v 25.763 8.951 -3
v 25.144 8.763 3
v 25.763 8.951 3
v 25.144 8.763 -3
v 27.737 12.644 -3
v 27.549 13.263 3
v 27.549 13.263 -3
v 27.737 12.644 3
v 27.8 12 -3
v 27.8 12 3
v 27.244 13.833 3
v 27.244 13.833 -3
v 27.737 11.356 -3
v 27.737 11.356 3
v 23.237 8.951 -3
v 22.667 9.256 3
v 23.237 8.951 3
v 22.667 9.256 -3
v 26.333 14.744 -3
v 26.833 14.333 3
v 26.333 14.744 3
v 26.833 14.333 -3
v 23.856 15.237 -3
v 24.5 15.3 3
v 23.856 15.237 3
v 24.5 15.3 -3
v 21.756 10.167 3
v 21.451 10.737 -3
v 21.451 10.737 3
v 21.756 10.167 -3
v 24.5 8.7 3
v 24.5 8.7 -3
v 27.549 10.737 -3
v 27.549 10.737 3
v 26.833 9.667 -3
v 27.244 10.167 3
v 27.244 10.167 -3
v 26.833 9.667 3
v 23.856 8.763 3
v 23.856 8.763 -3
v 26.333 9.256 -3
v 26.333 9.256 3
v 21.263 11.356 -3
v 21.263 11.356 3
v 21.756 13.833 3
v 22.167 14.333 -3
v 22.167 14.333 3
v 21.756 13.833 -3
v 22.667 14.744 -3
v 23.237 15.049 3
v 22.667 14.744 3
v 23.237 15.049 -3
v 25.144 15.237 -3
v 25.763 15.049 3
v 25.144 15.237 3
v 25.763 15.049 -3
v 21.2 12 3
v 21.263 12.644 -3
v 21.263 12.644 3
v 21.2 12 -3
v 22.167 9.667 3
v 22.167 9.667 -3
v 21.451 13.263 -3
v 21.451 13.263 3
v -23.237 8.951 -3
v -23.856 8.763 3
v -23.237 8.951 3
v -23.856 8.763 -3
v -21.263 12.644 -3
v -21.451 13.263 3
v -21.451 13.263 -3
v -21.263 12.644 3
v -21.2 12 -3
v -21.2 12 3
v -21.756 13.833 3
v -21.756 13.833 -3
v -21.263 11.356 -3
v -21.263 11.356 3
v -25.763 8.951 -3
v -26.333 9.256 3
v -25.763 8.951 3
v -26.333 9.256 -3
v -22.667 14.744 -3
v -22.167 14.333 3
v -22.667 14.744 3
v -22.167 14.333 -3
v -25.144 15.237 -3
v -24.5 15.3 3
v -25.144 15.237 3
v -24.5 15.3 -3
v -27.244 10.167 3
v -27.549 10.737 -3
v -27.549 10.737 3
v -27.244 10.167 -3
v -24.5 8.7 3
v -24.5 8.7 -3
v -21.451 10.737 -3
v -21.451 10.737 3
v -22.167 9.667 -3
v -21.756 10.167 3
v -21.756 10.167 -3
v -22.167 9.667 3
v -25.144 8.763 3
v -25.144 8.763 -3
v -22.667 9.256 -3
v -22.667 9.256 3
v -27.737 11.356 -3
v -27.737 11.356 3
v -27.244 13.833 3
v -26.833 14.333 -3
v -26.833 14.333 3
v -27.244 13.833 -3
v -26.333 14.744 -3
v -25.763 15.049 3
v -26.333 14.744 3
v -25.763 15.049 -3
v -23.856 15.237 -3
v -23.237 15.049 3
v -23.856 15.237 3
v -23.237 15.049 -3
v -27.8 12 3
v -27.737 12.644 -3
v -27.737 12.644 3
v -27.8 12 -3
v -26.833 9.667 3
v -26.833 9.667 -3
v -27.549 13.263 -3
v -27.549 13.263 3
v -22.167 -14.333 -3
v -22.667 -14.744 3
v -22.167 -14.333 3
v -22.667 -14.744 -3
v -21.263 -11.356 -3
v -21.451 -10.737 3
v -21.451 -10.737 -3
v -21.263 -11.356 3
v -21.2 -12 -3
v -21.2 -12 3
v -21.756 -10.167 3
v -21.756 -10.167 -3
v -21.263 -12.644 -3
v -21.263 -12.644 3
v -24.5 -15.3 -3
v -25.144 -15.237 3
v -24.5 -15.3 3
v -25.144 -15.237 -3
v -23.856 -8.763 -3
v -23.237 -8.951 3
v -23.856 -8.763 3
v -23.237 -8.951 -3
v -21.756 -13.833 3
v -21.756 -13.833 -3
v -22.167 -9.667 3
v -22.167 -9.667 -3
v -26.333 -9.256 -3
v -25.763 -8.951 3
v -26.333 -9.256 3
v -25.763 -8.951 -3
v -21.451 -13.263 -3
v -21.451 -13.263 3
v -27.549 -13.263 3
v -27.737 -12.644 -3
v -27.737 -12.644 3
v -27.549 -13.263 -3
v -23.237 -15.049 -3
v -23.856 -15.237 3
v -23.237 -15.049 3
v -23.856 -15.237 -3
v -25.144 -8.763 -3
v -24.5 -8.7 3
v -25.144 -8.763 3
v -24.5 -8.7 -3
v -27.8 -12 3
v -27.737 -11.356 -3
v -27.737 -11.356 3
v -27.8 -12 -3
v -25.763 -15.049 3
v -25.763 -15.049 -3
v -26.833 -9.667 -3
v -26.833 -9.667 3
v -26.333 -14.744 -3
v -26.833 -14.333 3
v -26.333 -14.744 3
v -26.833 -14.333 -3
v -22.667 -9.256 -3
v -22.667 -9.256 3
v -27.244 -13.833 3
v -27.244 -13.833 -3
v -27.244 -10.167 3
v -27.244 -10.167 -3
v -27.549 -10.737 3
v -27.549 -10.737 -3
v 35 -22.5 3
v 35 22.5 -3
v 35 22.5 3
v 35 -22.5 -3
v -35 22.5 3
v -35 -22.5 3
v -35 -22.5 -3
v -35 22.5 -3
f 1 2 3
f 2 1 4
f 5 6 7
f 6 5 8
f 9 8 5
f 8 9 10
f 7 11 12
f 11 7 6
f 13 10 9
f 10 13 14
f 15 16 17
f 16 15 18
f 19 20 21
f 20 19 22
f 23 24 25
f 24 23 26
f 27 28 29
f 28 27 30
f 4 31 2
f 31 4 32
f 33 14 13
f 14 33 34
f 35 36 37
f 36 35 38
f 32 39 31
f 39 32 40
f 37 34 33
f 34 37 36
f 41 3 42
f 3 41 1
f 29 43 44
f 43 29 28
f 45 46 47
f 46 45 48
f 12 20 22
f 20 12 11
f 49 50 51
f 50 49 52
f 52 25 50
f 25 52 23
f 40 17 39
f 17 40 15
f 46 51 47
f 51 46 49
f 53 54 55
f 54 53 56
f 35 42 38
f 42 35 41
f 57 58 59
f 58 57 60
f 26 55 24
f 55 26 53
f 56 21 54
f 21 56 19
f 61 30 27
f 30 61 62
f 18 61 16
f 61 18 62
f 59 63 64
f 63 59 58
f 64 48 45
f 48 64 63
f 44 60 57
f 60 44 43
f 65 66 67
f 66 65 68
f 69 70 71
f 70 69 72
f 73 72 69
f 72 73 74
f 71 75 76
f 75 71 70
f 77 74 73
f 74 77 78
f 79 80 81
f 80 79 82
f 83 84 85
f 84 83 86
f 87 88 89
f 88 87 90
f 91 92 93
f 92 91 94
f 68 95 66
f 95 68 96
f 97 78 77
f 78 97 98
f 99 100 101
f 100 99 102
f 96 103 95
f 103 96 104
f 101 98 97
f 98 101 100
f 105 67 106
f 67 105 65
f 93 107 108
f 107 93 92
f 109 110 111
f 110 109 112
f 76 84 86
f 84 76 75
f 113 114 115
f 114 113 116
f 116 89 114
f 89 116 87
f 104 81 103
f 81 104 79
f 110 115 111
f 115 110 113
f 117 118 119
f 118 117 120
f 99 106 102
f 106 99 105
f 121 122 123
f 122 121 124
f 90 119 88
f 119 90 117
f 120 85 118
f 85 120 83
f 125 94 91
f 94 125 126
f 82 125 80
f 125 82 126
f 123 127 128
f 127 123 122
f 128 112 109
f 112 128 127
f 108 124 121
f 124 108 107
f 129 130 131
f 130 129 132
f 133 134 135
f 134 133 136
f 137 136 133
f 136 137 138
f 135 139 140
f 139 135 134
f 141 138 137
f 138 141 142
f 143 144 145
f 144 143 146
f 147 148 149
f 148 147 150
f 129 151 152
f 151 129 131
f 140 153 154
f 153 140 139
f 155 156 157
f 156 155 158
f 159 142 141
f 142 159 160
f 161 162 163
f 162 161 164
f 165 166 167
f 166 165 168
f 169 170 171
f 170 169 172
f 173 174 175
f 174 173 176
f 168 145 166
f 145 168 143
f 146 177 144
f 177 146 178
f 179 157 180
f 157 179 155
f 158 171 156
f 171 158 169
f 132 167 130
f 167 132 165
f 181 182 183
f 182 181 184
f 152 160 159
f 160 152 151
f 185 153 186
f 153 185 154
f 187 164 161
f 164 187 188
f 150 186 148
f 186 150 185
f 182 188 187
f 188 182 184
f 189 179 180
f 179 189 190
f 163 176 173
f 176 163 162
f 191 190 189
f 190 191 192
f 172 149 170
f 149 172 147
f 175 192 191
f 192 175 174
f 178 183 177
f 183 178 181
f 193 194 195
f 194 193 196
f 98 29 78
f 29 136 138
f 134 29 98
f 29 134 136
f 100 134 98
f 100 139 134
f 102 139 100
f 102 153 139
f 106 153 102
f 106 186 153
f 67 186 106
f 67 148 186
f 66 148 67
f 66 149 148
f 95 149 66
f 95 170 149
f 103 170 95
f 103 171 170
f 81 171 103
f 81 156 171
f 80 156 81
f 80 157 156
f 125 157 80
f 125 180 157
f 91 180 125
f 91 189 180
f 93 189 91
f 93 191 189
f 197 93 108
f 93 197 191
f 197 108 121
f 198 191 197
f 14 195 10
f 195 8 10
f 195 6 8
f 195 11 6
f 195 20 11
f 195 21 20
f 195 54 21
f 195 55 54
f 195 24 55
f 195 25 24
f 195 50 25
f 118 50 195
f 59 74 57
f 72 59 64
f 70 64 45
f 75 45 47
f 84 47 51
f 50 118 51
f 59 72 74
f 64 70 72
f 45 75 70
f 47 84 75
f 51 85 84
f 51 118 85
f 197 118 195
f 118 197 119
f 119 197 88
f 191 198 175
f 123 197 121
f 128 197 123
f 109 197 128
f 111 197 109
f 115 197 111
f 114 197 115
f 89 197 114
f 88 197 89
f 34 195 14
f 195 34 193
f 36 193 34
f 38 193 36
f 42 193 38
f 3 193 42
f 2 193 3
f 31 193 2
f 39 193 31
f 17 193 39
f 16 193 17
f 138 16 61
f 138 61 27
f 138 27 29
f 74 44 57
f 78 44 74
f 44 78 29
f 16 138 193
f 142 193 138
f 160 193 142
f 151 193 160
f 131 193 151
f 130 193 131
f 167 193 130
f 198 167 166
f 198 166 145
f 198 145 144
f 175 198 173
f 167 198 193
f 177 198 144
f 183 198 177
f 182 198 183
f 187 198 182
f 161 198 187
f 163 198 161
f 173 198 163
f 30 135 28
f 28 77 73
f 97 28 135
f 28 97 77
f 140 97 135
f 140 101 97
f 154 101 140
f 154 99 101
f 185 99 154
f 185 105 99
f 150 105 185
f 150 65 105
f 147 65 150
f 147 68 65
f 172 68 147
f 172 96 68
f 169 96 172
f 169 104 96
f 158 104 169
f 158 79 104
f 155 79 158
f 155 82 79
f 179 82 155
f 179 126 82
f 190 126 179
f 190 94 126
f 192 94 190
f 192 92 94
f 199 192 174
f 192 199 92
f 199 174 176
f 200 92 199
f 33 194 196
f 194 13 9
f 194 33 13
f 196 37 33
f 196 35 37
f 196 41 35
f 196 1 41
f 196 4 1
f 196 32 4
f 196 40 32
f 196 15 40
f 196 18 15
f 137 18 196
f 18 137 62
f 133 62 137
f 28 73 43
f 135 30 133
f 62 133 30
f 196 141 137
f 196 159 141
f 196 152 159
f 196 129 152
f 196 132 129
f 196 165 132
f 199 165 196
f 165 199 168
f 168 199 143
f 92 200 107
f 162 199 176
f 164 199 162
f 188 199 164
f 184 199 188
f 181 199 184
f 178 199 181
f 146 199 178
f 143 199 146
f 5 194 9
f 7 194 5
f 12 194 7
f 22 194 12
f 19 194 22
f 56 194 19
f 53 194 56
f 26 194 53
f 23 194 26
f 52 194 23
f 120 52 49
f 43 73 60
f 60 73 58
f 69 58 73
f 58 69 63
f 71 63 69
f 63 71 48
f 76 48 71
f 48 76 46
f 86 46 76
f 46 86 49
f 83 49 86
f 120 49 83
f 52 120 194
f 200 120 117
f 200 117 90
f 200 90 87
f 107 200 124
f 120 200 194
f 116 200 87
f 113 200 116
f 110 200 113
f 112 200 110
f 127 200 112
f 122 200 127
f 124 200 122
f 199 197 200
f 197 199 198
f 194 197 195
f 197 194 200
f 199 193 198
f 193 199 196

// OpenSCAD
$fn = 32;

// ----------------------------------------------------------------------
// Corner plate 70 x 45 x 6
// 3 holes, centres taken from the edge offset
// ----------------------------------------------------------------------

// --- parameters (mm) ---
plate = [70, 45, 6];  // overall size (x, y, z)
holes = 3;            // number of holes the drawing asks for
hole_d = 6.6;         // hole diameter
edge = 10.5;          // hole centre offset from the plate edge

// --- derived feature positions (mm) ---
corner_x = plate[0] / 2 - edge;  // = 24.5   corner hole X
corner_y = plate[1] / 2 - edge;  // = 12   corner hole Y
feature_centers = [
  [corner_x, corner_y],
  [-corner_x, corner_y],
  [-corner_x, -corner_y]
];   // hole centres the loop below drills

// plate outline, every hole drilled through with the same cutters
difference() {
  cube(plate, center = true);
  for (centre = feature_centers)
    translate([centre[0], centre[1], 0])
      cylinder(d = hole_d, h = plate[2] + 2, center = true);
}
